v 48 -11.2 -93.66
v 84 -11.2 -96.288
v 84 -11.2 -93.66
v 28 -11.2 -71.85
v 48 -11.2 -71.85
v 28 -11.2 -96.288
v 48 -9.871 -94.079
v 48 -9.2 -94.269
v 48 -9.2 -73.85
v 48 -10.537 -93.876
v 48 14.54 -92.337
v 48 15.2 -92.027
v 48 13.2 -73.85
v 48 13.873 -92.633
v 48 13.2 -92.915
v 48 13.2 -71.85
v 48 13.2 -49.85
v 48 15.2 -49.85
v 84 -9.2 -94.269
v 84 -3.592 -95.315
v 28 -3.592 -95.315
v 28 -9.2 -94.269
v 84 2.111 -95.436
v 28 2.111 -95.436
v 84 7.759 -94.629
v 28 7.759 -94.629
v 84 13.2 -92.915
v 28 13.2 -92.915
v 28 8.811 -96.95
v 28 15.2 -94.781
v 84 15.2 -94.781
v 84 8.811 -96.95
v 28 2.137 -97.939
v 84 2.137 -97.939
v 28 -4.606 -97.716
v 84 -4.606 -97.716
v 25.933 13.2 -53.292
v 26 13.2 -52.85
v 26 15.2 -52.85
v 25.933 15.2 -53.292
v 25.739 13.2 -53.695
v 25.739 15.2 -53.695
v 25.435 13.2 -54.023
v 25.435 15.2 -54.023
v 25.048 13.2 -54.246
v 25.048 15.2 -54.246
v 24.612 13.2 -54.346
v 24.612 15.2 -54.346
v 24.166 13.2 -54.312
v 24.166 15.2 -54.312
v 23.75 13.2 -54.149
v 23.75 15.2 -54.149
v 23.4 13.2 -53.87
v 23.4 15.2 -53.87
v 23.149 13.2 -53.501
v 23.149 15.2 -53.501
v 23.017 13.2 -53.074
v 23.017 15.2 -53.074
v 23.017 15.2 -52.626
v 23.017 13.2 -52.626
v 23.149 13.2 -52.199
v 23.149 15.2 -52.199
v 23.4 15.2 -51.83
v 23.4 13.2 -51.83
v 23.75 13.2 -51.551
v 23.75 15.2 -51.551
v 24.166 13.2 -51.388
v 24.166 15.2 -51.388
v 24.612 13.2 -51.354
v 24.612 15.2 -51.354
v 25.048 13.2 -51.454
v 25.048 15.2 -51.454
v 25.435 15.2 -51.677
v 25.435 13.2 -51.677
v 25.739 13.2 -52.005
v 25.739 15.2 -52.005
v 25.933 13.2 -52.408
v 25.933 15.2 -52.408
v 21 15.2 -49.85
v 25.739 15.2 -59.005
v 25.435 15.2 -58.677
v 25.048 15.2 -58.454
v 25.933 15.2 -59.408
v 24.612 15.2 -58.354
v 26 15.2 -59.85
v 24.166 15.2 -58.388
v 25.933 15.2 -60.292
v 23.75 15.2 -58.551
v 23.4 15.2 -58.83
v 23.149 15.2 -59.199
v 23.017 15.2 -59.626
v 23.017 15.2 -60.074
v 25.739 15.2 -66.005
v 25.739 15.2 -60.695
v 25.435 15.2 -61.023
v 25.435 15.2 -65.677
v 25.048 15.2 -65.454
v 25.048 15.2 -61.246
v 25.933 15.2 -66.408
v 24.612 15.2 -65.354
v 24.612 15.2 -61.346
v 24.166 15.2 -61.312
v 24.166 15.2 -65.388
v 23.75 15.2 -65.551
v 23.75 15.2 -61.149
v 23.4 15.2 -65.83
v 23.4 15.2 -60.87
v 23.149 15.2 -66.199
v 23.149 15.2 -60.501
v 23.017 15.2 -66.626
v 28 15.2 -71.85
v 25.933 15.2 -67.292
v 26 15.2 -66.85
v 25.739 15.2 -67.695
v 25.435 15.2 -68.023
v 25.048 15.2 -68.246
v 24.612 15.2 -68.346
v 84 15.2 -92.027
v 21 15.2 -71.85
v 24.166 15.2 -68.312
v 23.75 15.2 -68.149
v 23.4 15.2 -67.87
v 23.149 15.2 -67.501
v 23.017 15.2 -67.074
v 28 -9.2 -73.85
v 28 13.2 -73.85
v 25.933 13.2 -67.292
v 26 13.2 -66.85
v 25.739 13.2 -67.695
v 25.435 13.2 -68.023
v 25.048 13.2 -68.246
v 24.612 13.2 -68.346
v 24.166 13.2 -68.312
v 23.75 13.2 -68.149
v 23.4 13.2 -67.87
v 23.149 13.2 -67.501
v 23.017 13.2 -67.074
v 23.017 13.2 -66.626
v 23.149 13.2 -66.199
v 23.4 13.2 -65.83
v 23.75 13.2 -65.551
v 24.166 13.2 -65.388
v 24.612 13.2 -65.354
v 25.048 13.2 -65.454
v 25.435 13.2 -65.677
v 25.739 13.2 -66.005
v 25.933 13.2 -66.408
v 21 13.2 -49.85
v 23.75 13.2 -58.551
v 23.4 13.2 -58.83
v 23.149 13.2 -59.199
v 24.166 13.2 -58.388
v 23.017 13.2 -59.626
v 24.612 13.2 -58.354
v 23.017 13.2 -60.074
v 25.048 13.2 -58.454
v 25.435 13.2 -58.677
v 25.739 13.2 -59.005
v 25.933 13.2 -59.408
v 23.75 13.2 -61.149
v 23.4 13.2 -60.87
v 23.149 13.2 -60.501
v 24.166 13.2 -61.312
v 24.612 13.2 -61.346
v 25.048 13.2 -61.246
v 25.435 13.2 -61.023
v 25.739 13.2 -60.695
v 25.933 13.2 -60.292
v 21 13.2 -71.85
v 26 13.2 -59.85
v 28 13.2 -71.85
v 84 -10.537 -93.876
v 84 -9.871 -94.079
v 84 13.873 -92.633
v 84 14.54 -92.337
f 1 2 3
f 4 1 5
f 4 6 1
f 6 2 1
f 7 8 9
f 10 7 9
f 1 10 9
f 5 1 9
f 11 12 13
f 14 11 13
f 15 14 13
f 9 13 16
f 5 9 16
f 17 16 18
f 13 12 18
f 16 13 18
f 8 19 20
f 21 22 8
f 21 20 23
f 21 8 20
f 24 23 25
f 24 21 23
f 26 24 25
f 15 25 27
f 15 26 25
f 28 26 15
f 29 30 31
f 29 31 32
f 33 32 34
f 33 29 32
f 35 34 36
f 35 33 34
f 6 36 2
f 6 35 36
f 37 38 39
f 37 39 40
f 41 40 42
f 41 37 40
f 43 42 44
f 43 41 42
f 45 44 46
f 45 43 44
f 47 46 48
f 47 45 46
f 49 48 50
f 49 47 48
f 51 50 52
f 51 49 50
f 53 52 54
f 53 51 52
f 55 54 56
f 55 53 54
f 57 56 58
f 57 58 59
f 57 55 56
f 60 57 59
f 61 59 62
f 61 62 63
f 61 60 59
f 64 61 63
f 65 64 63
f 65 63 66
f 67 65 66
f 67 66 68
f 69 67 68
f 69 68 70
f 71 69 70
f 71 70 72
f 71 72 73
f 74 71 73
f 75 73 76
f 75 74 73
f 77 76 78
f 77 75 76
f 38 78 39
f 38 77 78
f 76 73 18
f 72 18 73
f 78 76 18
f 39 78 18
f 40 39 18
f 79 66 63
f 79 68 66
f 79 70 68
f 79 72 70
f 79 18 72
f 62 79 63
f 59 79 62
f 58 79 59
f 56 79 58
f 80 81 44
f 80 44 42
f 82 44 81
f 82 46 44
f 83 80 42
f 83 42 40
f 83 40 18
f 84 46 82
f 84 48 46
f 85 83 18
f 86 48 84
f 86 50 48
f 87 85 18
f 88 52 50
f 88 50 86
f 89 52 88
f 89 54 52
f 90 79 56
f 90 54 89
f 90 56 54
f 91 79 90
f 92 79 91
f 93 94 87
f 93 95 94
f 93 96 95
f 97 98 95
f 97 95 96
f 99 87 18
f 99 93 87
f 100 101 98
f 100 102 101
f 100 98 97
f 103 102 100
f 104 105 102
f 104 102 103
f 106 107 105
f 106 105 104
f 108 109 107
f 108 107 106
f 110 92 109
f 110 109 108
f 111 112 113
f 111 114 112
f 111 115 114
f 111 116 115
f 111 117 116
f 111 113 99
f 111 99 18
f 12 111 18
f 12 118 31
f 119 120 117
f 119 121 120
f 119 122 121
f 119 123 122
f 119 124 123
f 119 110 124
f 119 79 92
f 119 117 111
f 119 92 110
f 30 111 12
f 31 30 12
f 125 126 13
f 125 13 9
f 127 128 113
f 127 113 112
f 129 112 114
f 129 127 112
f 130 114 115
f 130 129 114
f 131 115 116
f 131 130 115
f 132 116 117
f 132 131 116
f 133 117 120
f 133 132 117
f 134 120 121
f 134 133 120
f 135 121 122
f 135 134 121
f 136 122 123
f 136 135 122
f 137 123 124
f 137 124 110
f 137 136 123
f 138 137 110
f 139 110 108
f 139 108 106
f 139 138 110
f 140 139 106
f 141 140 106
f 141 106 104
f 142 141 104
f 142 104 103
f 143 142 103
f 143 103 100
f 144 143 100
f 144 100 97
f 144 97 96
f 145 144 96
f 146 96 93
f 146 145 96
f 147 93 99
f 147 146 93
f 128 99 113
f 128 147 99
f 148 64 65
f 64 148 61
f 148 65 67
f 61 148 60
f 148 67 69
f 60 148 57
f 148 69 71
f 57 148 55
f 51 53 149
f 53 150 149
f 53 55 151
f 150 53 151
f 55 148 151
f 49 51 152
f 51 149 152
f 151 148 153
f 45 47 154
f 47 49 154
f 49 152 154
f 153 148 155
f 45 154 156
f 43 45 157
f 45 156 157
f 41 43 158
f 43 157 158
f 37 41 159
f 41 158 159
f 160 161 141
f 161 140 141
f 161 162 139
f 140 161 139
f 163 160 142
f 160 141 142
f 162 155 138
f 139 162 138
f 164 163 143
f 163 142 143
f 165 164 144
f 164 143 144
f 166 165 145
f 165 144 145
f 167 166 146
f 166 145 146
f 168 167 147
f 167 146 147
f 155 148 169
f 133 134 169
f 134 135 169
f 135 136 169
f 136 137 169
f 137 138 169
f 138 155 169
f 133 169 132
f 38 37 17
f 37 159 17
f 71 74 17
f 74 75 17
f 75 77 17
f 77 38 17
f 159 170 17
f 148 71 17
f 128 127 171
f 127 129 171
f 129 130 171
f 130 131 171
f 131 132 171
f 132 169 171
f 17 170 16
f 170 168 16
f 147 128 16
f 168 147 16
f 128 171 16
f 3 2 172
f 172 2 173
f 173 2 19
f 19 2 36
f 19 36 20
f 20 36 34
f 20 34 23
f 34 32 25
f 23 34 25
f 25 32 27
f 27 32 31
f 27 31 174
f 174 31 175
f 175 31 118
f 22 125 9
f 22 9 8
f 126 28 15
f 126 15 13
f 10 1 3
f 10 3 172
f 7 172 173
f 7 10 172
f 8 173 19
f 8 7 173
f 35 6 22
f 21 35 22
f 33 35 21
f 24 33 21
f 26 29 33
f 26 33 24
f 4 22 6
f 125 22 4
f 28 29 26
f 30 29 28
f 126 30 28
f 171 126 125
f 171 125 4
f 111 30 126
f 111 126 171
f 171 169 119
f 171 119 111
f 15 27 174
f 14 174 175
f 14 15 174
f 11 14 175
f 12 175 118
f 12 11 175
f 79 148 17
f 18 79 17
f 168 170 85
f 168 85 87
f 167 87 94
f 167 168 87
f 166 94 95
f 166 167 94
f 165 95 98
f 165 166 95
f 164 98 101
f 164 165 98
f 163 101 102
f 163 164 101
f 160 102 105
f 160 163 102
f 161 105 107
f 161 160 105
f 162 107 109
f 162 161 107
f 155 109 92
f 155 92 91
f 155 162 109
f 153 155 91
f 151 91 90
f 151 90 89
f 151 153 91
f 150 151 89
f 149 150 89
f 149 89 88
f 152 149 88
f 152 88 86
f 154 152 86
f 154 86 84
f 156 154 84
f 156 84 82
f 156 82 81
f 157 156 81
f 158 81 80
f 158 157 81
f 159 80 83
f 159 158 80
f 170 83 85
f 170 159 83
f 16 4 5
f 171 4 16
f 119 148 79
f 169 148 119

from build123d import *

# Parameters (mm, degrees)
SKETCH3_W           = 27
SKETCH3_H           = 22
SKETCH3_R           = 1.5
BOSS_EXTRUDE5_DEPTH = 2
BOSS_EXTRUDE6_DEPTH = 20
BOSS_EXTRUDE7_DEPTH = 56


with BuildPart() as part:
    # Sketch3 → Boss-Extrude5 (new body)
    with BuildSketch(Plane(origin=(0, 13.2, 0), x_dir=(1, 0, 0), z_dir=(0, 1, 0))):
        with Locations((34.5, 60.85)):
            Rectangle(SKETCH3_W, SKETCH3_H)
        with Locations((24.5, 59.85)):
            Circle(SKETCH3_R, mode=Mode.SUBTRACT)
        with Locations((24.5, 66.85)):
            Circle(SKETCH3_R, mode=Mode.SUBTRACT)
        with Locations((24.5, 52.85)):
            Circle(SKETCH3_R, mode=Mode.SUBTRACT)
    extrude(amount=BOSS_EXTRUDE5_DEPTH)

    # Sketch4 → Boss-Extrude6 (add)
    with BuildSketch(Plane.ZY.offset(-28)):
        with BuildLine():
            Line((-71.85, -11.2), (-71.85, 15.2))
            Line((-71.85, 15.2), (-92.027131173, 15.2))
            ThreePointArc((-92.027131173, 15.2), (-92.486915012, 14.206944358), (-92.915428425, 13.2))
            Line((-92.915428425, 13.2), (-73.85, 13.2))
            Line((-73.85, 13.2), (-73.85, -9.2))
            Line((-73.85, -9.2), (-94.269216751, -9.2))
            ThreePointArc((-94.269216751, -9.2), (-93.979353281, -10.204553096), (-93.659613991, -11.2))
            Line((-93.659613991, -11.2), (-71.85, -11.2))
        make_face()
    extrude(amount=-BOSS_EXTRUDE6_DEPTH)

    # Sketch4<3> → Boss-Extrude7 (add)
    with BuildSketch(Plane.ZY.offset(-28)):
        with BuildLine():
            ThreePointArc((-92.915428425, 13.2), (-92.486915012, 14.206944358), (-92.027131173, 15.2))
            Line((-92.027131173, 15.2), (-94.78133603, 15.2))
            ThreePointArc((-94.78133603, 15.2), (-97.939046263, 2.137244706), (-96.288405944, -11.2))
            Line((-96.288405944, -11.2), (-93.659613991, -11.2))
            ThreePointArc((-93.659613991, -11.2), (-93.979353281, -10.204553096), (-94.269216751, -9.2))
            ThreePointArc((-94.269216751, -9.2), (-95.436253581, 2.111441618), (-92.915428425, 13.2))
        make_face()
    extrude(amount=-BOSS_EXTRUDE7_DEPTH)


solid = part.part
